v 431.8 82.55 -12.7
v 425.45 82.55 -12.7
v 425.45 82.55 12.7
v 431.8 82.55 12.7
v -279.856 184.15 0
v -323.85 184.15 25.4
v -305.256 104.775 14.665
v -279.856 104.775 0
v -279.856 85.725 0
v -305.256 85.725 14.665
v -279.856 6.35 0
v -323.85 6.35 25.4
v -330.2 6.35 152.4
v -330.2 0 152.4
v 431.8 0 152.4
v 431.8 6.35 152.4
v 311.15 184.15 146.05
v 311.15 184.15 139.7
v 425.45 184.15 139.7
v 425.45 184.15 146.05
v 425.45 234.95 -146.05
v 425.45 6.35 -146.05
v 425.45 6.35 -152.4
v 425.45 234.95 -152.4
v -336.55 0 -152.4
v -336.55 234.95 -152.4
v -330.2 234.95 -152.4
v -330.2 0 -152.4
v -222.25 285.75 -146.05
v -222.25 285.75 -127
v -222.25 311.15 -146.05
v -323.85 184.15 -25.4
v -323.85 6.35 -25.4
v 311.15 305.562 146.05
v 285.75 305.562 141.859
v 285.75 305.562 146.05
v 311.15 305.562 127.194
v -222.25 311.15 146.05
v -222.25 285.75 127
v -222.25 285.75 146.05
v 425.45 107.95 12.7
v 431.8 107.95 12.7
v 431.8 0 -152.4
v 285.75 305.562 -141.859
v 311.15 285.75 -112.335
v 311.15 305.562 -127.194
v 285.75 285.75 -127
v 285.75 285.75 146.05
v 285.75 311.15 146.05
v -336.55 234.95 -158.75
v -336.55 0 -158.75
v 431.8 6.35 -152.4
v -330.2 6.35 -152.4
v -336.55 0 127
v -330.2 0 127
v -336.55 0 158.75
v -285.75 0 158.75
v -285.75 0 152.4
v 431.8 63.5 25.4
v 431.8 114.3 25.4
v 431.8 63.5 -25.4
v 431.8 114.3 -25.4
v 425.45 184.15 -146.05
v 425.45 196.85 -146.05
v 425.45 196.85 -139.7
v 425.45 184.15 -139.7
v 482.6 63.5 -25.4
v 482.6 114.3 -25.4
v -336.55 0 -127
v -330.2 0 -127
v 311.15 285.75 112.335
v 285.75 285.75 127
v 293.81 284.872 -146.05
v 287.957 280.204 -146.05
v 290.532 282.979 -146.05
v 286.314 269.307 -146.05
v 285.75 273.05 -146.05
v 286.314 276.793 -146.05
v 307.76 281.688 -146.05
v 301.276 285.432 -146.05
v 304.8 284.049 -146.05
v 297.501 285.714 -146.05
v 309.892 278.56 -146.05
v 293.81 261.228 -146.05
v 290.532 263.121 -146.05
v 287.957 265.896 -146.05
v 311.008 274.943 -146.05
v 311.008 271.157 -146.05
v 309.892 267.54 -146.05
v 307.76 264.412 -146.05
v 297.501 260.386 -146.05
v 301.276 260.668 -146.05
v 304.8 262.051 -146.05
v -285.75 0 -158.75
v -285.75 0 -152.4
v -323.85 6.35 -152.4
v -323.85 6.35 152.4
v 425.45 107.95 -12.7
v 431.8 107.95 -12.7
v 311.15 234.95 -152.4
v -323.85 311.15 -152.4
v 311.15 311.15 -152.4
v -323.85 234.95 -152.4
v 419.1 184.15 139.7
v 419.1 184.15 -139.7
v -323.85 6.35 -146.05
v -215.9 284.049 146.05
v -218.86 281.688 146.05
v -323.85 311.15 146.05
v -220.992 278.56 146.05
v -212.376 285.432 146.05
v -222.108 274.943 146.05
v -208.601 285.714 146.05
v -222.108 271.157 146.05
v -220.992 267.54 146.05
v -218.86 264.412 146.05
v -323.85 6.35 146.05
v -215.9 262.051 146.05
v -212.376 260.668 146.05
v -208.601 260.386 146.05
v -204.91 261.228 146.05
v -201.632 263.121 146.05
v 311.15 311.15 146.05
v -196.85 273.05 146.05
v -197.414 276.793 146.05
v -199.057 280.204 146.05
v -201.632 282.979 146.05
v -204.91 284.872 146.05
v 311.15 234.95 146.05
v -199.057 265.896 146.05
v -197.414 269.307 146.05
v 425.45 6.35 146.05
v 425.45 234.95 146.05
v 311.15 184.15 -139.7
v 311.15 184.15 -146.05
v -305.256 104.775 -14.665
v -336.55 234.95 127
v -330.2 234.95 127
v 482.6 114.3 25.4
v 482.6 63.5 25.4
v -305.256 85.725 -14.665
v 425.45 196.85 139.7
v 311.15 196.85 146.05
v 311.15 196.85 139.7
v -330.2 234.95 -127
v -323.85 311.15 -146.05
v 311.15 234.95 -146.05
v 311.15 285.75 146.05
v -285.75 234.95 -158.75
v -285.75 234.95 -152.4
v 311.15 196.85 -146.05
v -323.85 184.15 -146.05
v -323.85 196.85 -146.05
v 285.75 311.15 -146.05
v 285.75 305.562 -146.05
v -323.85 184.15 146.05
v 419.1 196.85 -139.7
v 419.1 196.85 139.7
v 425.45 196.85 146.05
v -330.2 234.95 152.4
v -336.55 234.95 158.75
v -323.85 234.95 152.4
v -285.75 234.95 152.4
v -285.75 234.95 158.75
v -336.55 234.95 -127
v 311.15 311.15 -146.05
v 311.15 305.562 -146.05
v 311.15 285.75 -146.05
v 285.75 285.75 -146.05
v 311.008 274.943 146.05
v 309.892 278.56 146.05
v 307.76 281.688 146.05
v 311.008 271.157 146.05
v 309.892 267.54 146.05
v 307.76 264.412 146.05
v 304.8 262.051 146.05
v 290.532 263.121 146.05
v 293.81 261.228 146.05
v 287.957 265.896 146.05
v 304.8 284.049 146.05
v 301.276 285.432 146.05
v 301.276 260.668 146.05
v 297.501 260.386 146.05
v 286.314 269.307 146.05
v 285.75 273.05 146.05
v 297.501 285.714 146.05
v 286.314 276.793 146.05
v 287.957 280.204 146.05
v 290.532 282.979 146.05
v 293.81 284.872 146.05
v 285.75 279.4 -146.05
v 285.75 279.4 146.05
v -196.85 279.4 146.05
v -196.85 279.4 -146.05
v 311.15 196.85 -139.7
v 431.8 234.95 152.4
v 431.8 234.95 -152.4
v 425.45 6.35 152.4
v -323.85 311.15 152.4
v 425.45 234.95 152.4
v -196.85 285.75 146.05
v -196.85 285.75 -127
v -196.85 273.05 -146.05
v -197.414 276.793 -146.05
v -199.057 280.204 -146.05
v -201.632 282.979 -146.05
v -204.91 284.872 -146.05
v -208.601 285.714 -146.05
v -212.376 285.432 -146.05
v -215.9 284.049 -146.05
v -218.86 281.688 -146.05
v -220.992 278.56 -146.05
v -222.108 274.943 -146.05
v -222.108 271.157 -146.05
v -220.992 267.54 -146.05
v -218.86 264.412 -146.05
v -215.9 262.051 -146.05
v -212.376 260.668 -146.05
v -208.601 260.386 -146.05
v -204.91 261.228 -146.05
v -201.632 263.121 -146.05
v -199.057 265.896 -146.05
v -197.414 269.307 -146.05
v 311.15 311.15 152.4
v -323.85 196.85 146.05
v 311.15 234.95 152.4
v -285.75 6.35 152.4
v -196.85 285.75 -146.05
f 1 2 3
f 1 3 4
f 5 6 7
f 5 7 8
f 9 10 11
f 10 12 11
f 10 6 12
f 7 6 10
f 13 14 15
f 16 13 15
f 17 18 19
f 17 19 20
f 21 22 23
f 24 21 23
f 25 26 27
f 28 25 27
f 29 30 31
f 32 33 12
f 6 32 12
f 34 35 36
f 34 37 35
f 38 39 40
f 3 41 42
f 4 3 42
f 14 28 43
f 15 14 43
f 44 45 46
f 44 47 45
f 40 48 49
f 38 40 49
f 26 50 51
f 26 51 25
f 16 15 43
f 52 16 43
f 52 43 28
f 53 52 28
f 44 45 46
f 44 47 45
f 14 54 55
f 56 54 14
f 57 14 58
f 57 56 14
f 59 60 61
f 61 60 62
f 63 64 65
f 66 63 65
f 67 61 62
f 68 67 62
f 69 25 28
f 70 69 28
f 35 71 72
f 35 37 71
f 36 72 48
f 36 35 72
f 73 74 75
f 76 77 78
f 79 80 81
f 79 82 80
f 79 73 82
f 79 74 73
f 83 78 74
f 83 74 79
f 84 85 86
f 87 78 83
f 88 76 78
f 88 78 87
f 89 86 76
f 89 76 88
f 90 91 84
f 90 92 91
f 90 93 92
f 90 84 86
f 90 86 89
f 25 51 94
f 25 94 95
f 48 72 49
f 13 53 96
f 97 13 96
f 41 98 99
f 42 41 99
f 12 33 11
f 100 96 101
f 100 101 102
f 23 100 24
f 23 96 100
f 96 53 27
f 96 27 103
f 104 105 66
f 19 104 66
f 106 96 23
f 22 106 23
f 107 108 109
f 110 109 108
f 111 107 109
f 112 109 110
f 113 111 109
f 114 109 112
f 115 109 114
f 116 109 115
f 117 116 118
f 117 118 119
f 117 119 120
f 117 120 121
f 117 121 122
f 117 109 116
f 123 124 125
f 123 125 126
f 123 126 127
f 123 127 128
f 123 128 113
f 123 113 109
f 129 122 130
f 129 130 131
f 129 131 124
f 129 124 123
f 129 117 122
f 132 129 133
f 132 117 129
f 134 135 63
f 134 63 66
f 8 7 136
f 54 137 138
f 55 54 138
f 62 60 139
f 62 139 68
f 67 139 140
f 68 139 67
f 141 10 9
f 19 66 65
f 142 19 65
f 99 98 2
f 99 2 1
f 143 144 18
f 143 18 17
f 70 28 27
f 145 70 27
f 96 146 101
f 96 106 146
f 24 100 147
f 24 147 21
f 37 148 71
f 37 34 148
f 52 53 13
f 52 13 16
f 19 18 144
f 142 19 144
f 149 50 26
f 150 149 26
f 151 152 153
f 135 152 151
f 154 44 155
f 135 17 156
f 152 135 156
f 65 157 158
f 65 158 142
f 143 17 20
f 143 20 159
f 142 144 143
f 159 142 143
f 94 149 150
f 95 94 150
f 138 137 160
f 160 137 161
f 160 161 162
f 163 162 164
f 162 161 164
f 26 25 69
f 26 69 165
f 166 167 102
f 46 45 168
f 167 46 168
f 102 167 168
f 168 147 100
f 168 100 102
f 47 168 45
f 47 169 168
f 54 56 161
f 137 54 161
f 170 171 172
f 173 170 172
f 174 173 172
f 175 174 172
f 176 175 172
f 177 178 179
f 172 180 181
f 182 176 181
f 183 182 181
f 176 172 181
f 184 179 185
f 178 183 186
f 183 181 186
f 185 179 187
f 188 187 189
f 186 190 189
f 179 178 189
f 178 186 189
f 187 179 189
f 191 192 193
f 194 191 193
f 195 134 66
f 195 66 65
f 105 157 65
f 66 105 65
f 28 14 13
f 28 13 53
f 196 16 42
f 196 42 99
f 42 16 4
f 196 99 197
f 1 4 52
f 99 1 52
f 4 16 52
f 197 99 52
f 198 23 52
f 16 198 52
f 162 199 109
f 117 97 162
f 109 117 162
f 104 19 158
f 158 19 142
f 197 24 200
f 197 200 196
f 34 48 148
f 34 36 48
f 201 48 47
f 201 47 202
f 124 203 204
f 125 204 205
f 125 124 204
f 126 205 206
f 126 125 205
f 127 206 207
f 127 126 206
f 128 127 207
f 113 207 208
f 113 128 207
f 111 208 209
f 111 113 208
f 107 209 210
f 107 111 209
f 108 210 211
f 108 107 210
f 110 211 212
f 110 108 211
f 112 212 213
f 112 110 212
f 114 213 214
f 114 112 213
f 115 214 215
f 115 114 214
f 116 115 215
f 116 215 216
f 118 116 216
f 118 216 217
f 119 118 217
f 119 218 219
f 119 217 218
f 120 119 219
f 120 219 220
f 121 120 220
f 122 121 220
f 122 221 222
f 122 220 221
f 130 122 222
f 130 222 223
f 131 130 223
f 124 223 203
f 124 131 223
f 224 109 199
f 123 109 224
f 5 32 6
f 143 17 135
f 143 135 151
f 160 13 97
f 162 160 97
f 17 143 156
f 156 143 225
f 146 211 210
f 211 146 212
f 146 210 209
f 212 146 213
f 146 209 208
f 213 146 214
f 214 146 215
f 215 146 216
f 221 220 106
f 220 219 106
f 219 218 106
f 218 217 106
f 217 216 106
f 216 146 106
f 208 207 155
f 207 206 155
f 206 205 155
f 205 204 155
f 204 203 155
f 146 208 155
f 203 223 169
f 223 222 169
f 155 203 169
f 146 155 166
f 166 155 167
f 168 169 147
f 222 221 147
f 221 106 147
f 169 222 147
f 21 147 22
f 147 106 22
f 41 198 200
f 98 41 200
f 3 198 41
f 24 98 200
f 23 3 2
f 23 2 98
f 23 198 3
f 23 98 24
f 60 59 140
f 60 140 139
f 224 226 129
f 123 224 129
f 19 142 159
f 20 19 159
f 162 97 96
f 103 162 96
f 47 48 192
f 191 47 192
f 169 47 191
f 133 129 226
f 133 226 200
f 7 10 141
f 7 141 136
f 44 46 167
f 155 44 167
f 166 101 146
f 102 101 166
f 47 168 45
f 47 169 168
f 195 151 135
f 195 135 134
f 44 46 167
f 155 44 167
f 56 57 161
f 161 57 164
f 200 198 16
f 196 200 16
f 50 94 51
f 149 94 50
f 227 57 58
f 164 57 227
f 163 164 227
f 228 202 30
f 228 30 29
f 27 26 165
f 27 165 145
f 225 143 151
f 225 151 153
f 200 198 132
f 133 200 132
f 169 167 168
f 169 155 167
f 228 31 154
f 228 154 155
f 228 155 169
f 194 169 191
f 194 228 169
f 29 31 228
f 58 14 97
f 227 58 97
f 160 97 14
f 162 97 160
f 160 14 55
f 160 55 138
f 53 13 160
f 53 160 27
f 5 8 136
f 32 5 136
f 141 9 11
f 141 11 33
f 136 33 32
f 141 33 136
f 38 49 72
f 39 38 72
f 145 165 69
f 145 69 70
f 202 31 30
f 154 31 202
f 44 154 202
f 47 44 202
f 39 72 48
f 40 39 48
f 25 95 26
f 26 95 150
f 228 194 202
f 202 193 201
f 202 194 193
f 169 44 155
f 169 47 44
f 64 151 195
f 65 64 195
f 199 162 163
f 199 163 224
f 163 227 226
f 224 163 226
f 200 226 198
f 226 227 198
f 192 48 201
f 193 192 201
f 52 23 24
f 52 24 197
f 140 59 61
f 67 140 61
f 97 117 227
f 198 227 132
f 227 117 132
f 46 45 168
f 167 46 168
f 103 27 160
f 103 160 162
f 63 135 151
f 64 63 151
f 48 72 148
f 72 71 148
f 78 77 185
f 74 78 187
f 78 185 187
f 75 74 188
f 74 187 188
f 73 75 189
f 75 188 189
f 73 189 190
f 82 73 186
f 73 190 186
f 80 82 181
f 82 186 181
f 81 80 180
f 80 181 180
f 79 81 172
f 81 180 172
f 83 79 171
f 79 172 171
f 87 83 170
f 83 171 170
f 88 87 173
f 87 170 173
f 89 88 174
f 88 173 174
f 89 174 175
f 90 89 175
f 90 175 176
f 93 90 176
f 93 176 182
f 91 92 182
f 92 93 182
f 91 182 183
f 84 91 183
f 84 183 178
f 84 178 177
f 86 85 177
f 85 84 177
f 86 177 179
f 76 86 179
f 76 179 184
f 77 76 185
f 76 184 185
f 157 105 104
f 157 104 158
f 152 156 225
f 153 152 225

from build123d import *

# Parameters (mm, degrees)
SKETCH1_W                             = 660.4
SKETCH1_H                             = 304.8
SKETCH1_W_2                           = 101.6
FOND_DEPTH                            = 6.35
SKETCH2_W                             = 749.3
SKETCH2_H                             = 6.35
COT_S_HAUT_DEPTH                      = 228.6
COT_S_HAUT_2_DEPTH                    = 228.6
SKETCH3_W                             = 6.35
SKETCH3_H                             = 304.8
COT_ES_BAS_DEPTH                      = 228.6
COT_ES_BAS_2_DEPTH                    = 228.6
SKETCH4_W                             = 635
SKETCH4_H                             = 6.35
SUPPORT_CAGE_DEPTH                    = 76.2
SKETCH5_W                             = 6.35
SKETCH5_H                             = 12.7
SUPPORT_TRAPPE_COT_ES_DEPTH           = 114.3
SUPPORT_TRAPPE_COT_ES_2_DEPTH         = 114.3
SUPPORT_TRAPPE_DEVANT_REACH           = 609.114
SKETCH6_W                             = 6.35
SKETCH6_H                             = 12.7
PLANCHER_MILLIEU_REACH                = 612.195
SKETCH7_W                             = 635
SKETCH7_H                             = 12.7
ROULEAU_REACH                         = 612.195
SKETCH8_R                             = 12.7
SKETCH10_W                            = 482.6
SKETCH10_H                            = 6.35
SOUTIEN_TAPIS_DEPTH                   = 292.1
REBORD_START                          = -25.4
REBORD_TAPIS_DEPTH                    = 508
V_POUR_VIS_SANS_FIN_DEPTH             = 177.8
TROU_V_VIS_SANS_FIN_REACH             = 555.617
SKETCH17_W                            = 25.4
SKETCH17_H                            = 19.05
TROU_V_VIS_SANS_FIN_DIRECTION_2_REACH = 555.617
TROU_SORTIE_VIS_SANS_FIN_DEPTH        = 12.7
TROU_SORTIE_VIS_SANS_FIN_DEPTH_BACK   = 12.7
SKETCH18_W                            = 12.7
SKETCH18_H                            = 25.4
REBORD_START_2                        = -44.45
SKETCH19_W                            = 6.35
SKETCH19_H                            = 234.95
REBORD_POUR_SAC_POUBELLE_DEPTH        = 50.8
SKETCH34_W                            = 6.35
SKETCH34_H                            = 234.95
REBORD_POUR_SAC_POUBELLE_2_DEPTH      = 25.4
SKETCH31_W                            = 50.8
SKETCH31_H                            = 50.8
BOITE_MOTEUR_VIS_SANS_DEPTH           = 50.8


with BuildPart() as part:
    # Sketch1 → Fond (new body)
    with BuildSketch(Plane(origin=(0, 0, 0), x_dir=(1, 0, 0), z_dir=(0, 1, 0))):
        Rectangle(SKETCH1_W, SKETCH1_H)
        with Locations((381, 0)):
            Rectangle(SKETCH1_W_2, SKETCH1_H)
    extrude(amount=FOND_DEPTH)


with BuildPart() as body_2:
    # Sketch2 → Cotés Haut (new body)
    with BuildSketch(Plane(origin=(0, 6.35, 0), x_dir=(1, 0, 0), z_dir=(0, 1, 0))):
        with Locations((50.8, 149.225)):
            Rectangle(SKETCH2_W, SKETCH2_H)
    extrude(amount=COT_S_HAUT_DEPTH)



with BuildPart() as body_3:
    # Sketch2 → Cot_s Haut 2 (new body)
    with BuildSketch(Plane(origin=(0, 6.35, 0), x_dir=(1, 0, 0), z_dir=(0, 1, 0))):
        with Locations((50.8, -149.225)):
            Rectangle(SKETCH2_W, SKETCH2_H)
    extrude(amount=COT_S_HAUT_2_DEPTH)


with BuildPart() as body_4:
    # Sketch3 → Cotées Bas (new body)
    with BuildSketch(Plane(origin=(0, 6.35, 0), x_dir=(1, 0, 0), z_dir=(0, 1, 0))):
        with Locations((-327.025, 0)):
            Rectangle(SKETCH3_W, SKETCH3_H)
    extrude(amount=COT_ES_BAS_DEPTH)


with BuildPart() as body_5:
    # Sketch3 → Cot_es Bas 2 (new body)
    with BuildSketch(Plane(origin=(0, 6.35, 0), x_dir=(1, 0, 0), z_dir=(0, 1, 0))):
        with Locations((428.625, 0)):
            Rectangle(SKETCH3_W, SKETCH3_H)
    extrude(amount=COT_ES_BAS_2_DEPTH)

    # Sketch18 → Trou sortie vis sans fin (cut, two sides: drawn at the far end of the back side and taken through both)
    with BuildSketch(Plane.XY.offset(-TROU_SORTIE_VIS_SANS_FIN_DEPTH_BACK)):
        with Locations((431.8, 95.25)):
            Rectangle(SKETCH18_W, SKETCH18_H)
    extrude(amount=TROU_SORTIE_VIS_SANS_FIN_DEPTH + TROU_SORTIE_VIS_SANS_FIN_DEPTH_BACK, mode=Mode.SUBTRACT)


with BuildPart() as body_2_1:
    add(body_2.part)

    add(body_3.part)  # Support Cage merges body 3
    # Sketch4 → Support Cage (add)
    with BuildSketch(Plane(origin=(0, 234.95, 0), x_dir=(1, 0, 0), z_dir=(0, 1, 0))):
        with Locations((-6.35, 149.225)):
            Rectangle(SKETCH4_W, SKETCH4_H)
        with Locations((-6.35, -149.225)):
            Rectangle(SKETCH4_W, SKETCH4_H)
    extrude(amount=SUPPORT_CAGE_DEPTH)


with BuildPart() as body_5_2:
    # Sketch5 → Support Trappe cotées (new body)
    with BuildSketch(Plane.ZY.offset(-425.45)):
        with Locations((-142.875, 190.5)):
            Rectangle(SKETCH5_W, SKETCH5_H)
    extrude(amount=SUPPORT_TRAPPE_COT_ES_DEPTH)


with BuildPart() as body_6:
    # Sketch5 → Support Trappe cot_es 2 (new body)
    with BuildSketch(Plane.ZY.offset(-425.45)):
        with Locations((142.875, 190.5)):
            Rectangle(SKETCH5_W, SKETCH5_H)
    extrude(amount=SUPPORT_TRAPPE_COT_ES_2_DEPTH)


with BuildPart() as body_7:

    # Sketch6 → Support Trappe devant (new, up to next)
    with BuildSketch(Plane.XY.offset(-139.7), mode=Mode.PRIVATE) as support_trappe_devant_sk1:
        with Locations((422.275, 190.5)):
            Rectangle(SKETCH6_W, SKETCH6_H)
    support_trappe_devant_tool1 = extrude(support_trappe_devant_sk1.sketch, amount=SUPPORT_TRAPPE_DEVANT_REACH, mode=Mode.PRIVATE) - body_6.part
    add(support_trappe_devant_tool1.solids().sort_by_distance((422.275, 190.5, -139.7))[0])


with BuildPart() as body_8:

    # Sketch7 → Plancher millieu (new, up to next)
    with BuildSketch(Plane(origin=(0, 0, 146.05), x_dir=(-1, 0, 0), z_dir=(0, 0, -1)), mode=Mode.PRIVATE) as plancher_millieu_sk1:
        with Locations((6.35, 190.5)):
            Rectangle(SKETCH7_W, SKETCH7_H)
    plancher_millieu_tool1 = extrude(plancher_millieu_sk1.sketch, amount=PLANCHER_MILLIEU_REACH, mode=Mode.PRIVATE) - body_2_1.part
    add(plancher_millieu_tool1.solids().sort_by_distance((-6.35, 190.5, 146.05))[0])


with BuildPart() as body_9:

    # Sketch8 → Rouleau (new, up to next)
    with BuildSketch(Plane(origin=(0, 0, 146.05), x_dir=(-1, 0, 0), z_dir=(0, 0, -1)), mode=Mode.PRIVATE) as rouleau_sk1:
        with Locations((-298.45, 273.05)):
            Circle(SKETCH8_R)
    rouleau_tool1 = extrude(rouleau_sk1.sketch, amount=ROULEAU_REACH, mode=Mode.PRIVATE) - body_2_1.part
    rouleau = rouleau_tool1.solids().sort_by_distance((298.45, 273.05, 146.05))[0]
    add(rouleau)


with BuildPart() as body_2_2:
    add(body_2_1.part)

    # Mirror1: Rouleau across plane
    add(rouleau.mirror(Plane(origin=(44.45, 0, 0), x_dir=(0, 0, 1), z_dir=(1, 0, 0))))

    # Mirror9 2: loft between two sections, ruled curve by curve
    mirror9_2_from = [
        Edge.make_line((311.15, 305.562, -127.194303163), (311.15, 305.562, -146.05)),
        Edge.make_line((311.15, 285.75, -146.05), (311.15, 285.75, -112.335303163)),
        Edge.make_line((311.15, 285.75, -112.335303163), (311.15, 305.562, -127.194303163)),
        Edge.make_line((311.15, 285.75, -146.05), (311.15, 305.562, -146.05)),
    ]
    mirror9_2_to = [
        Edge.make_line((285.75, 305.562, -141.859), (285.75, 305.562, -146.05)),
        Edge.make_line((285.75, 285.75, -146.05), (285.75, 285.75, -127)),
        Edge.make_line((285.75, 285.75, -127), (285.75, 305.562, -141.859)),
        Edge.make_line((285.75, 285.75, -146.05), (285.75, 305.562, -146.05)),
    ]
    mirror9_2 = Solid(Shell([*[Face.make_surface_from_curves(mirror9_2_from[k], mirror9_2_to[k]) for k in range(4)], Face(Wire(mirror9_2_from)), Face(Wire(mirror9_2_to))]))
    add(mirror9_2)


with BuildPart() as body_10:
    # Sketch10 → Soutien tapis (new body)
    with BuildSketch(Plane(origin=(0, 0, 146.05), x_dir=(-1, 0, 0), z_dir=(0, 0, -1))):
        with Locations((-44.45, 282.575)):
            Rectangle(SKETCH10_W, SKETCH10_H)
    extrude(amount=SOUTIEN_TAPIS_DEPTH)


with BuildPart() as body_11:
    # Sketch11 → Rebord tapis (new body)
    with BuildSketch(Plane(origin=(311.15, 0, 0), x_dir=(0, 0, -1), z_dir=(1, 0, 0)).offset(REBORD_START)):
        Polygon((-146.05, 311.15), (-127, 285.75), (-146.05, 285.75), align=None)
    rebord_tapis = extrude(amount=-REBORD_TAPIS_DEPTH)


with BuildPart() as body_10_1:
    add(body_10.part)

    # Mirror5: Rebord tapis across plane
    add(rebord_tapis.mirror(Plane.XY))

    # Mirror9: read off the stored shape, not the designer's step
    # Mirror9: loft between two sections, ruled curve by curve
    mirror9_from = [
        Edge.make_line((311.15, 285.75, -146.05), (311.15, 285.75, -112.335303163)),
        Edge.make_line((311.15, 305.562, -127.194303163), (311.15, 305.562, -146.05)),
        Edge.make_line((311.15, 285.75, -112.335303163), (311.15, 305.562, -127.194303163)),
        Edge.make_line((311.15, 305.562, -146.05), (311.15, 285.75, -146.05)),
    ]
    mirror9_to = [
        Edge.make_line((285.75, 285.75, -146.05), (285.75, 285.75, -127)),
        Edge.make_line((285.75, 305.562, -141.859), (285.75, 305.562, -146.05)),
        Edge.make_line((285.75, 285.75, -127), (285.75, 305.562, -141.859)),
        Edge.make_line((285.75, 305.562, -146.05), (285.75, 285.75, -146.05)),
    ]
    mirror9 = Solid(Shell([*[Face.make_surface_from_curves(mirror9_from[k], mirror9_to[k]) for k in range(4)], Face(Wire(mirror9_from)), Face(Wire(mirror9_to))]))
    add(mirror9)


with BuildPart() as body_12:
    # Sketch13 → V pour vis sans fin (new body)
    with BuildSketch(Plane(origin=(0, 6.35, 0), x_dir=(1, 0, 0), z_dir=(0, 1, 0))):
        Polygon((-279.855909488, 0), (-323.85, 25.4), (-323.85, -25.4), align=None)
    extrude(amount=V_POUR_VIS_SANS_FIN_DEPTH)

    # Trou V vis sans fin: up to this face of the body (flat: up to its plane)
    trou_v_vis_sans_fin_end = Plane(body_12.part.faces().sort_by_distance((-301.852954744, 95.25, -12.7))[0])
    # Sketch17 → Trou V vis sans fin (cut, up to the picked face)
    with BuildSketch(Plane.XY, mode=Mode.PRIVATE) as trou_v_vis_sans_fin_sk1:
        with Locations((-292.555909488, 95.25)):
            Rectangle(SKETCH17_W, SKETCH17_H)
    trou_v_vis_sans_fin_tool1 = split(extrude(trou_v_vis_sans_fin_sk1.sketch, amount=-TROU_V_VIS_SANS_FIN_REACH, mode=Mode.PRIVATE), bisect_by=trou_v_vis_sans_fin_end, keep=Keep.BOTH, mode=Mode.PRIVATE)
    add(trou_v_vis_sans_fin_tool1.solids().sort_by(Axis((-292.555909, 95.25, 0), (0, 0, -1)))[0], mode=Mode.SUBTRACT)

    # Trou V vis sans fin direction 2: up to this face of the body (flat: up to its plane)
    trou_v_vis_sans_fin_direction_2_end = Plane(body_12.part.faces().sort_by_distance((-301.852954744, 95.25, 12.7))[0])
    # Sketch17 → Trou V vis sans fin direction 2 (cut, up to the picked face)
    with BuildSketch(Plane.XY, mode=Mode.PRIVATE) as trou_v_vis_sans_fin_direction_2_sk1:
        with Locations((-292.555909488, 95.25)):
            Rectangle(SKETCH17_W, SKETCH17_H)
    trou_v_vis_sans_fin_direction_2_tool1 = split(extrude(trou_v_vis_sans_fin_direction_2_sk1.sketch, amount=TROU_V_VIS_SANS_FIN_DIRECTION_2_REACH, mode=Mode.PRIVATE), bisect_by=trou_v_vis_sans_fin_direction_2_end, keep=Keep.BOTH, mode=Mode.PRIVATE)
    add(trou_v_vis_sans_fin_direction_2_tool1.solids().sort_by(Axis((-292.555909, 95.25, 0), (0, 0, 1)))[0], mode=Mode.SUBTRACT)


with BuildPart() as body_13:
    # Sketch19 → Rebord pour sac poubelle (new body)
    with BuildSketch(Plane.ZY.offset(330.2).offset(REBORD_START_2)):
        with Locations((-155.575, 117.475)):
            Rectangle(SKETCH19_W, SKETCH19_H)
    rebord_pour_sac_poubelle = extrude(amount=REBORD_POUR_SAC_POUBELLE_DEPTH)


with BuildPart() as body_14:
    # Sketch34 → Rebord pour sac poubelle 2 (new body)
    with BuildSketch(Plane.XY.offset(-152.4)):
        with Locations((-333.375, 117.475)):
            Rectangle(SKETCH34_W, SKETCH34_H)
    rebord_pour_sac_poubelle_2 = extrude(amount=REBORD_POUR_SAC_POUBELLE_2_DEPTH)


with BuildPart() as body_15:
    # Rebord tapis 2: read off the stored shape, not the designer's step
    # Rebord tapis 2: loft between two sections, ruled curve by curve
    rebord_tapis_2_from = [
        Edge.make_line((285.75, 285.75, 127), (285.75, 285.75, 146.05)),
        Edge.make_line((285.75, 285.75, 146.05), (311.15, 285.75, 146.05)),
        Edge.make_line((311.15, 285.75, 112.335303163), (285.75, 285.75, 127)),
        Edge.make_line((311.15, 285.75, 146.05), (311.15, 285.75, 112.335303163)),
    ]
    rebord_tapis_2_to = [
        Edge.make_line((285.75, 305.562, 141.859), (285.75, 305.562, 146.05)),
        Edge.make_line((285.75, 305.562, 146.05), (311.15, 305.562, 146.05)),
        Edge.make_line((311.15, 305.562, 127.194303163), (285.75, 305.562, 141.859)),
        Edge.make_line((311.15, 305.562, 146.05), (311.15, 305.562, 127.194303163)),
    ]
    rebord_tapis_2 = Solid(Shell([*[Face.make_surface_from_curves(rebord_tapis_2_from[k], rebord_tapis_2_to[k]) for k in range(4)], Face(Wire(rebord_tapis_2_from)), Face(Wire(rebord_tapis_2_to))]))
    add(rebord_tapis_2)


with BuildPart() as body_16:
    # Sketch31 → Boite moteur vis sans (new body)
    with BuildSketch(Plane(origin=(431.8, 0, 0), x_dir=(0, 0, -1), z_dir=(1, 0, 0))):
        with Locations((0, 88.9)):
            Rectangle(SKETCH31_W, SKETCH31_H)
    extrude(amount=BOITE_MOTEUR_VIS_SANS_DEPTH)


with BuildPart() as body_2_3:
    add(body_2_2.part)

    # Mirror11: Rebord pour sac poubelle across plane
    add(rebord_pour_sac_poubelle.mirror(Plane.XY))

    # Mirror18: Rebord pour sac poubelle 2 across plane
    add(rebord_pour_sac_poubelle_2.mirror(Plane.XY))


solid = Compound([part.part, body_4.part, body_5.part, body_5_2.part, body_6.part, body_7.part, body_8.part, body_9.part, body_11.part, body_10_1.part, body_12.part, body_13.part, body_14.part, body_15.part, body_16.part, body_2_3.part])
